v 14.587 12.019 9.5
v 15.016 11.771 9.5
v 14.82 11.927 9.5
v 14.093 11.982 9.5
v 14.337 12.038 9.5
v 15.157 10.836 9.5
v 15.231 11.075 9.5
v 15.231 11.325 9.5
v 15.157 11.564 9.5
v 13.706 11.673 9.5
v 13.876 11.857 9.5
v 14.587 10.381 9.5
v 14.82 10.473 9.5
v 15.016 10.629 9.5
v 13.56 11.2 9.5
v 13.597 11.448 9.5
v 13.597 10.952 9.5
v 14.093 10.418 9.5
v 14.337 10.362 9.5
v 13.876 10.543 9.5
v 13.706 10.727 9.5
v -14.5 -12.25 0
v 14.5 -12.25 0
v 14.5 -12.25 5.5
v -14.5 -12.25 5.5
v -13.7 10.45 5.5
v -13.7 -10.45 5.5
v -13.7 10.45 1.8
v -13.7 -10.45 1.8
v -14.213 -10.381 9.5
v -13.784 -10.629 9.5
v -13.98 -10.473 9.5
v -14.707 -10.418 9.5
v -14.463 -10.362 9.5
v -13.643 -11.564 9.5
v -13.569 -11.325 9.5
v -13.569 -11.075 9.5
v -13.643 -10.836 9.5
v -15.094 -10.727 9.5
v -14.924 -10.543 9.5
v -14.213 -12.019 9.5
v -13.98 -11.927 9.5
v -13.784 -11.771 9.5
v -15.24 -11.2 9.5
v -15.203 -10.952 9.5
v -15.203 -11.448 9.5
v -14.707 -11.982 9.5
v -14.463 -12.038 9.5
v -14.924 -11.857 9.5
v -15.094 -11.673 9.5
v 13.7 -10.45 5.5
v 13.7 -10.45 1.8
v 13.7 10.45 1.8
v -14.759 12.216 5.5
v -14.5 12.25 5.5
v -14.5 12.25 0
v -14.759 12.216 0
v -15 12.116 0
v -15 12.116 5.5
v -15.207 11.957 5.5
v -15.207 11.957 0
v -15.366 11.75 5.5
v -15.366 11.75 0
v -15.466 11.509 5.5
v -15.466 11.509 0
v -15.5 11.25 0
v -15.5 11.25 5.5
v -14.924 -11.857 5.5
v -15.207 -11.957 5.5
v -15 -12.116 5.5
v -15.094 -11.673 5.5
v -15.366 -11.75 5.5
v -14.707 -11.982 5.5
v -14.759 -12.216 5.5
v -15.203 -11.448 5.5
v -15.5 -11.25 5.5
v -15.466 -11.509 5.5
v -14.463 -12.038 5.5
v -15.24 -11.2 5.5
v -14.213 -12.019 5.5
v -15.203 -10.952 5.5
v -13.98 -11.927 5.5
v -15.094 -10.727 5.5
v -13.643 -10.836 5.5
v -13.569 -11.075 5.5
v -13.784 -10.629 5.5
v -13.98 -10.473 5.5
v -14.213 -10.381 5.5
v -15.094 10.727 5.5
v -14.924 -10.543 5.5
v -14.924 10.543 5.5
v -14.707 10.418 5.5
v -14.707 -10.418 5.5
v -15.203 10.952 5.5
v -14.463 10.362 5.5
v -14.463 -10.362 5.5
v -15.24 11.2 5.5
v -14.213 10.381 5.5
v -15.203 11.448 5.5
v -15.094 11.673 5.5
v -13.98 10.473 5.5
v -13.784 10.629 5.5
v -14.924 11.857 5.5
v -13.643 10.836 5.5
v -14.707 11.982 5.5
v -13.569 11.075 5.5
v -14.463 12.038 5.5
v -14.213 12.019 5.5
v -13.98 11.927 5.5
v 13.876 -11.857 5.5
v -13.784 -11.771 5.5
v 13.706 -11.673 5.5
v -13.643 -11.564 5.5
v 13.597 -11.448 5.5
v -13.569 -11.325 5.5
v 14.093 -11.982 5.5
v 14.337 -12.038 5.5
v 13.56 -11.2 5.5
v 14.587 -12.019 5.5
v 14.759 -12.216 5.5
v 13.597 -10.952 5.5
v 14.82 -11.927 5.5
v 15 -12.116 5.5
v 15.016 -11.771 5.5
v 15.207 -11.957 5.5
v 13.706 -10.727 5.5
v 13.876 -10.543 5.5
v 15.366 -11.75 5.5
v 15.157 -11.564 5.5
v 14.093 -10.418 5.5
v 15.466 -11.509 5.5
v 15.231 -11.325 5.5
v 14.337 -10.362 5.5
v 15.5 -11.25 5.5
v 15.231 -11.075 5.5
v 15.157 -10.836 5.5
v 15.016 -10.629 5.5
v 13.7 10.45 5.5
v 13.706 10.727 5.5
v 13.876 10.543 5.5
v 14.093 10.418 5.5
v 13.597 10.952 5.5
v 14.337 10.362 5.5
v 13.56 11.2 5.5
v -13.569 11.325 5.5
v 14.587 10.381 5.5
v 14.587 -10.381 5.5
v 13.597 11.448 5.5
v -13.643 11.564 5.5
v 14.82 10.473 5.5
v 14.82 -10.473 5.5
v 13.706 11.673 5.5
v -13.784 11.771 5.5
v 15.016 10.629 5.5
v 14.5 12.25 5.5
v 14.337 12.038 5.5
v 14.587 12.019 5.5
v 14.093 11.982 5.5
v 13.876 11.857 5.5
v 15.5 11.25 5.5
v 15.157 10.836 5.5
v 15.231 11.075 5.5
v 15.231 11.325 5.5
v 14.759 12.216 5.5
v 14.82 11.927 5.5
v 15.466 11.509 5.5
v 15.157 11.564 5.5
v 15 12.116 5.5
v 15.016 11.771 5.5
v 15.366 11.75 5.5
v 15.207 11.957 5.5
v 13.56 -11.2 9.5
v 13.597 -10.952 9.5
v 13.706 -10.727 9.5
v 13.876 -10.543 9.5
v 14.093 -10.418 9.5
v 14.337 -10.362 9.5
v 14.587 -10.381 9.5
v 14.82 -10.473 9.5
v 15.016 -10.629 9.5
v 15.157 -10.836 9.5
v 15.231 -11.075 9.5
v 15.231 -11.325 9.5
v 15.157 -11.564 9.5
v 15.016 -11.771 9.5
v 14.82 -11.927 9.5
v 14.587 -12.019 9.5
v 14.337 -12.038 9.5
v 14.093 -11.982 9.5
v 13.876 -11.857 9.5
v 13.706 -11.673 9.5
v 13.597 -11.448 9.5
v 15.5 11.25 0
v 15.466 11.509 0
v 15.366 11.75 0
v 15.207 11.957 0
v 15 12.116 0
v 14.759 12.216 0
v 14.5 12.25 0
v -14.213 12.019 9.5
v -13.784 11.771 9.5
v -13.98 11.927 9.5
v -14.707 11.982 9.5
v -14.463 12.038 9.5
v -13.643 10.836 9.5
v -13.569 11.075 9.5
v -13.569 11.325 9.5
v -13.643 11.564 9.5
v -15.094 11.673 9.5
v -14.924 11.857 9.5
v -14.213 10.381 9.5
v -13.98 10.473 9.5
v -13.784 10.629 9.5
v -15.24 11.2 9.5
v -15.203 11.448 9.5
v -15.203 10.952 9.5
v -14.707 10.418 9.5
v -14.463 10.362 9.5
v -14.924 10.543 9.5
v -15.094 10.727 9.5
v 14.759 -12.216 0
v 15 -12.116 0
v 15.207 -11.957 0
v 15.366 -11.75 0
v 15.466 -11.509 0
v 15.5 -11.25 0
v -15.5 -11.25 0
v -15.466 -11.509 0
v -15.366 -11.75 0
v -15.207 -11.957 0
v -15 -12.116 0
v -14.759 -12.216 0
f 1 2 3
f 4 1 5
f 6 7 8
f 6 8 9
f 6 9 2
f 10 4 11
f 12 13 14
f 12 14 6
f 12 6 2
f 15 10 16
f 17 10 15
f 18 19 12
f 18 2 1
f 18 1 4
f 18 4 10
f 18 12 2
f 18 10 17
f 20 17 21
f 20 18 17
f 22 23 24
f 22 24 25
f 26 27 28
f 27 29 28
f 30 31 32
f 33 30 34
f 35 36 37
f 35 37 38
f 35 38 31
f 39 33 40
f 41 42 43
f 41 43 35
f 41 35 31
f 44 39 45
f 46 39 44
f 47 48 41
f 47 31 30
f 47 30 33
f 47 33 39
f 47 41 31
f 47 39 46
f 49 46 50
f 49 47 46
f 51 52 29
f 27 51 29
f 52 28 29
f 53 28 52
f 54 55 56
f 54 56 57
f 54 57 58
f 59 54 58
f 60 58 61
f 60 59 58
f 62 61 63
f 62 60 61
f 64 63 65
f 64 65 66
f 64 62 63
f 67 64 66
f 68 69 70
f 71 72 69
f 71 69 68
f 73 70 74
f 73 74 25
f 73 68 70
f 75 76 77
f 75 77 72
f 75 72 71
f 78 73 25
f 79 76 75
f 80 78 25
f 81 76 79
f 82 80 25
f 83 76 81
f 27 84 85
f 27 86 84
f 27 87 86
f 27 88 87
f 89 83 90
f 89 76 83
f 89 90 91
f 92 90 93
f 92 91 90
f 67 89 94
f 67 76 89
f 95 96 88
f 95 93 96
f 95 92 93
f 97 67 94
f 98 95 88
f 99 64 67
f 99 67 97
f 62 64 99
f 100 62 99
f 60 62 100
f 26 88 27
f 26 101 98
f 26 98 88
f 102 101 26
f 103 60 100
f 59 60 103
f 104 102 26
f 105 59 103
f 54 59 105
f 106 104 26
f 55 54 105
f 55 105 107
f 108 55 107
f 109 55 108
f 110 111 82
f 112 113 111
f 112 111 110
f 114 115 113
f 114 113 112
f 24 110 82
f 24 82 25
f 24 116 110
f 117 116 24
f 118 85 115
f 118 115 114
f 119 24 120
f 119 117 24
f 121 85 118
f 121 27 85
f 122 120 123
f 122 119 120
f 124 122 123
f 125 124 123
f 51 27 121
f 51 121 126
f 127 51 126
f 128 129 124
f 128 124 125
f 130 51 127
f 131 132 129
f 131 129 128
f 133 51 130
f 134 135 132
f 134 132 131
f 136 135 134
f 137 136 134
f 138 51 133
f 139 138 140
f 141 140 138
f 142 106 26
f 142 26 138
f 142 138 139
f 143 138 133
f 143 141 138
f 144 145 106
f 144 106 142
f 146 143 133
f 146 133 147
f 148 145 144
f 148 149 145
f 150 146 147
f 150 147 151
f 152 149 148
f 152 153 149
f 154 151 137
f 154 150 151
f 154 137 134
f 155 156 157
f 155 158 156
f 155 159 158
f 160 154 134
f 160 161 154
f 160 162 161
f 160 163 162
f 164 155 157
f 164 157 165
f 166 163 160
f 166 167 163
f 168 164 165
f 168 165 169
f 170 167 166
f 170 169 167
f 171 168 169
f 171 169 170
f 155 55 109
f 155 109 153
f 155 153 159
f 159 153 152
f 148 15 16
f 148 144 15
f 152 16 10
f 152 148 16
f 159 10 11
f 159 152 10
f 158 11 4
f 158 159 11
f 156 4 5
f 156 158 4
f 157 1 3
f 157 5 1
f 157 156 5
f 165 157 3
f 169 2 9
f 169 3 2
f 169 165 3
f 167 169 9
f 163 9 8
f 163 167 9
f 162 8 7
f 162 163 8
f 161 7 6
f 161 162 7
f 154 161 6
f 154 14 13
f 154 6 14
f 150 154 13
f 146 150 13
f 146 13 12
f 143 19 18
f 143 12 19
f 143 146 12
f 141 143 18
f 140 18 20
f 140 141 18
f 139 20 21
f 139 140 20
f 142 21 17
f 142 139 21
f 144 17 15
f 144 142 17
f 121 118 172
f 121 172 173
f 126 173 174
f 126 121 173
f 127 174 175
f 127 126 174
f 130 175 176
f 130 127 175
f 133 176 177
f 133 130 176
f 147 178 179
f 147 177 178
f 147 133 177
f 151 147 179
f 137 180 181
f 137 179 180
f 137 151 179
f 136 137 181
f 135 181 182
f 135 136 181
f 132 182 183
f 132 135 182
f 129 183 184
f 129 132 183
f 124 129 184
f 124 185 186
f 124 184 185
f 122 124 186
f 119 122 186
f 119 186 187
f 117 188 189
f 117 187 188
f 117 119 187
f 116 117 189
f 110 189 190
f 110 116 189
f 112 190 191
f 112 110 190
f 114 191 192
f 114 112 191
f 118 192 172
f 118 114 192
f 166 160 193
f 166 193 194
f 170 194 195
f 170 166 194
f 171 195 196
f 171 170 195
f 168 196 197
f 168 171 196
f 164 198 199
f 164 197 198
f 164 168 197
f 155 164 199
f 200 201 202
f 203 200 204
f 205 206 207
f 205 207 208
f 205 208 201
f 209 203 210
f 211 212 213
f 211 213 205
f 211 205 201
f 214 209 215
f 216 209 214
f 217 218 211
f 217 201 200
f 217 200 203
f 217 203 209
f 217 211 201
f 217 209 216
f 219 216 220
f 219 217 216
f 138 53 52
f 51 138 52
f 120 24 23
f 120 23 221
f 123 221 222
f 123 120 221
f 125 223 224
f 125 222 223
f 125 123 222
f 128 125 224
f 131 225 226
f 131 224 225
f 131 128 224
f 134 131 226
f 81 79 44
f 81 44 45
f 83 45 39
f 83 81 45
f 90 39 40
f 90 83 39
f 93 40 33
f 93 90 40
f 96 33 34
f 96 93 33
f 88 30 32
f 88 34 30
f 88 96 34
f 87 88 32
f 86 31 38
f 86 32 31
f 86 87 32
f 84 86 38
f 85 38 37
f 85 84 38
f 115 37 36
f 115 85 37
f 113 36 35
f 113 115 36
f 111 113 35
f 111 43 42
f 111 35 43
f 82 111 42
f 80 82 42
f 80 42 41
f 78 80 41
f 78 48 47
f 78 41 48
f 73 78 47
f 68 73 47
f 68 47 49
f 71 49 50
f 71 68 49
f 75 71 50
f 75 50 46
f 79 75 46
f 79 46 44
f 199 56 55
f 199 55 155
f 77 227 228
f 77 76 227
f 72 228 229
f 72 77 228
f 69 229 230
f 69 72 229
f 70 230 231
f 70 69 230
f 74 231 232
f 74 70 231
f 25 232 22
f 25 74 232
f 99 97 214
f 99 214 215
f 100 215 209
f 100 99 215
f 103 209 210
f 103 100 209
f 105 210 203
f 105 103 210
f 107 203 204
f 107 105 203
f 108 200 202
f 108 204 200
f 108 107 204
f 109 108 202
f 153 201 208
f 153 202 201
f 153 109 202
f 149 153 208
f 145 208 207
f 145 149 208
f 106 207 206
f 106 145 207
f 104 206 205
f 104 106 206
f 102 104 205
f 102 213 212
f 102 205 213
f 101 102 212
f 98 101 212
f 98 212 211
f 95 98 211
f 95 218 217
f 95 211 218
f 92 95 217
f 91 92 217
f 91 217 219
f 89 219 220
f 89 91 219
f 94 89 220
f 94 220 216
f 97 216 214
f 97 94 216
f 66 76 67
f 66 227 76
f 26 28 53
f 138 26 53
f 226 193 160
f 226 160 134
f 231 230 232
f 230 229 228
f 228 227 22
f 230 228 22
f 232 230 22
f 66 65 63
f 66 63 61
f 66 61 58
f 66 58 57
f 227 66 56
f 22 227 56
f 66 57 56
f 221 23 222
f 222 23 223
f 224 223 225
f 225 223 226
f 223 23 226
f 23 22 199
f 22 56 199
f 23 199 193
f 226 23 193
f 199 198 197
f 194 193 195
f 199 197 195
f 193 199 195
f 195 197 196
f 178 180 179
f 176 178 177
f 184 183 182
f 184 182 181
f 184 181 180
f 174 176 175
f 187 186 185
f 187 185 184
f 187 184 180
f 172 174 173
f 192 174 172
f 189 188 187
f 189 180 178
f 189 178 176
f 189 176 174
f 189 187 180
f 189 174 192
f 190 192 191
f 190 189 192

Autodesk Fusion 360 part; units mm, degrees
sketch "Sketch1" plane through (0, 0, 0) normal (0, 0, 1) x (1, 0, 0)
  line L0 (-15.5, 12.25) -> (15.5, 12.25)
  line L1 (15.5, 12.25) -> (15.5, -12.25)
  line L2 (15.5, -12.25) -> (-15.5, -12.25)
  line L3 (-15.5, -12.25) -> (-15.5, 12.25)
  line L4 (-15.5, 12.25) -> (15.5, -12.25) construction
  line L5 (15.5, 12.25) -> (-15.5, -12.25) construction
  dimension "d1" = 31
  dimension "d2" = 24.5
extrude "Extrude1" add sketch "Sketch1" along normal blind 5.5
shell "Shell1" thickness 1.8 removed faces 1 at (-5.1667, 4.0833, 5.5)
sketch "Sketch2" plane through (0, 0, 5.5) normal (0, 0, 1) x (-1, 0, 0)
  line L0 (13.7, 10.45) -> (13.7, -10.45)
  line L1 (13.7, -10.45) -> (-13.7, -10.45)
  line L2 (-13.7, -10.45) -> (-13.7, 10.45)
  line L3 (-13.7, 10.45) -> (13.7, 10.45)
  line L4 (15.5, 12.25) -> (-15.5, 12.25)
  line L5 (-15.5, 12.25) -> (-15.5, -12.25)
  line L6 (-15.5, -12.25) -> (15.5, -12.25)
  line L7 (15.5, -12.25) -> (15.5, 12.25)
  circle A0 centre (14.4, -11.2) radius 0.84
  line L8 (0, 0) -> (0, -2)
  line L9 (0, 0) -> (4, 0)
  circle A1 centre (-14.4, -11.2) radius 0.84
  circle A2 centre (-14.4, 11.2) radius 0.84
  circle A3 centre (14.4, 11.2) radius 0.84
  dimension "d6" = 1.68
  dimension "d7" = 11.2
  dimension "d8" = 14.4
extrude "Extrude2" add sketch "Sketch2" along normal blind 4 contours A0 | A1 | A2 | A3
fillet "Fillet1" radius 1 1 edges at (15.5, -12.25, 2.75)
fillet "Fillet1" radius 1 1 edges at (15.5, 12.25, 2.75)
fillet "Fillet1" radius 1 1 edges at (-15.5, 12.25, 2.75)
fillet "Fillet1" radius 1 1 edges at (-15.5, -12.25, 2.75)
